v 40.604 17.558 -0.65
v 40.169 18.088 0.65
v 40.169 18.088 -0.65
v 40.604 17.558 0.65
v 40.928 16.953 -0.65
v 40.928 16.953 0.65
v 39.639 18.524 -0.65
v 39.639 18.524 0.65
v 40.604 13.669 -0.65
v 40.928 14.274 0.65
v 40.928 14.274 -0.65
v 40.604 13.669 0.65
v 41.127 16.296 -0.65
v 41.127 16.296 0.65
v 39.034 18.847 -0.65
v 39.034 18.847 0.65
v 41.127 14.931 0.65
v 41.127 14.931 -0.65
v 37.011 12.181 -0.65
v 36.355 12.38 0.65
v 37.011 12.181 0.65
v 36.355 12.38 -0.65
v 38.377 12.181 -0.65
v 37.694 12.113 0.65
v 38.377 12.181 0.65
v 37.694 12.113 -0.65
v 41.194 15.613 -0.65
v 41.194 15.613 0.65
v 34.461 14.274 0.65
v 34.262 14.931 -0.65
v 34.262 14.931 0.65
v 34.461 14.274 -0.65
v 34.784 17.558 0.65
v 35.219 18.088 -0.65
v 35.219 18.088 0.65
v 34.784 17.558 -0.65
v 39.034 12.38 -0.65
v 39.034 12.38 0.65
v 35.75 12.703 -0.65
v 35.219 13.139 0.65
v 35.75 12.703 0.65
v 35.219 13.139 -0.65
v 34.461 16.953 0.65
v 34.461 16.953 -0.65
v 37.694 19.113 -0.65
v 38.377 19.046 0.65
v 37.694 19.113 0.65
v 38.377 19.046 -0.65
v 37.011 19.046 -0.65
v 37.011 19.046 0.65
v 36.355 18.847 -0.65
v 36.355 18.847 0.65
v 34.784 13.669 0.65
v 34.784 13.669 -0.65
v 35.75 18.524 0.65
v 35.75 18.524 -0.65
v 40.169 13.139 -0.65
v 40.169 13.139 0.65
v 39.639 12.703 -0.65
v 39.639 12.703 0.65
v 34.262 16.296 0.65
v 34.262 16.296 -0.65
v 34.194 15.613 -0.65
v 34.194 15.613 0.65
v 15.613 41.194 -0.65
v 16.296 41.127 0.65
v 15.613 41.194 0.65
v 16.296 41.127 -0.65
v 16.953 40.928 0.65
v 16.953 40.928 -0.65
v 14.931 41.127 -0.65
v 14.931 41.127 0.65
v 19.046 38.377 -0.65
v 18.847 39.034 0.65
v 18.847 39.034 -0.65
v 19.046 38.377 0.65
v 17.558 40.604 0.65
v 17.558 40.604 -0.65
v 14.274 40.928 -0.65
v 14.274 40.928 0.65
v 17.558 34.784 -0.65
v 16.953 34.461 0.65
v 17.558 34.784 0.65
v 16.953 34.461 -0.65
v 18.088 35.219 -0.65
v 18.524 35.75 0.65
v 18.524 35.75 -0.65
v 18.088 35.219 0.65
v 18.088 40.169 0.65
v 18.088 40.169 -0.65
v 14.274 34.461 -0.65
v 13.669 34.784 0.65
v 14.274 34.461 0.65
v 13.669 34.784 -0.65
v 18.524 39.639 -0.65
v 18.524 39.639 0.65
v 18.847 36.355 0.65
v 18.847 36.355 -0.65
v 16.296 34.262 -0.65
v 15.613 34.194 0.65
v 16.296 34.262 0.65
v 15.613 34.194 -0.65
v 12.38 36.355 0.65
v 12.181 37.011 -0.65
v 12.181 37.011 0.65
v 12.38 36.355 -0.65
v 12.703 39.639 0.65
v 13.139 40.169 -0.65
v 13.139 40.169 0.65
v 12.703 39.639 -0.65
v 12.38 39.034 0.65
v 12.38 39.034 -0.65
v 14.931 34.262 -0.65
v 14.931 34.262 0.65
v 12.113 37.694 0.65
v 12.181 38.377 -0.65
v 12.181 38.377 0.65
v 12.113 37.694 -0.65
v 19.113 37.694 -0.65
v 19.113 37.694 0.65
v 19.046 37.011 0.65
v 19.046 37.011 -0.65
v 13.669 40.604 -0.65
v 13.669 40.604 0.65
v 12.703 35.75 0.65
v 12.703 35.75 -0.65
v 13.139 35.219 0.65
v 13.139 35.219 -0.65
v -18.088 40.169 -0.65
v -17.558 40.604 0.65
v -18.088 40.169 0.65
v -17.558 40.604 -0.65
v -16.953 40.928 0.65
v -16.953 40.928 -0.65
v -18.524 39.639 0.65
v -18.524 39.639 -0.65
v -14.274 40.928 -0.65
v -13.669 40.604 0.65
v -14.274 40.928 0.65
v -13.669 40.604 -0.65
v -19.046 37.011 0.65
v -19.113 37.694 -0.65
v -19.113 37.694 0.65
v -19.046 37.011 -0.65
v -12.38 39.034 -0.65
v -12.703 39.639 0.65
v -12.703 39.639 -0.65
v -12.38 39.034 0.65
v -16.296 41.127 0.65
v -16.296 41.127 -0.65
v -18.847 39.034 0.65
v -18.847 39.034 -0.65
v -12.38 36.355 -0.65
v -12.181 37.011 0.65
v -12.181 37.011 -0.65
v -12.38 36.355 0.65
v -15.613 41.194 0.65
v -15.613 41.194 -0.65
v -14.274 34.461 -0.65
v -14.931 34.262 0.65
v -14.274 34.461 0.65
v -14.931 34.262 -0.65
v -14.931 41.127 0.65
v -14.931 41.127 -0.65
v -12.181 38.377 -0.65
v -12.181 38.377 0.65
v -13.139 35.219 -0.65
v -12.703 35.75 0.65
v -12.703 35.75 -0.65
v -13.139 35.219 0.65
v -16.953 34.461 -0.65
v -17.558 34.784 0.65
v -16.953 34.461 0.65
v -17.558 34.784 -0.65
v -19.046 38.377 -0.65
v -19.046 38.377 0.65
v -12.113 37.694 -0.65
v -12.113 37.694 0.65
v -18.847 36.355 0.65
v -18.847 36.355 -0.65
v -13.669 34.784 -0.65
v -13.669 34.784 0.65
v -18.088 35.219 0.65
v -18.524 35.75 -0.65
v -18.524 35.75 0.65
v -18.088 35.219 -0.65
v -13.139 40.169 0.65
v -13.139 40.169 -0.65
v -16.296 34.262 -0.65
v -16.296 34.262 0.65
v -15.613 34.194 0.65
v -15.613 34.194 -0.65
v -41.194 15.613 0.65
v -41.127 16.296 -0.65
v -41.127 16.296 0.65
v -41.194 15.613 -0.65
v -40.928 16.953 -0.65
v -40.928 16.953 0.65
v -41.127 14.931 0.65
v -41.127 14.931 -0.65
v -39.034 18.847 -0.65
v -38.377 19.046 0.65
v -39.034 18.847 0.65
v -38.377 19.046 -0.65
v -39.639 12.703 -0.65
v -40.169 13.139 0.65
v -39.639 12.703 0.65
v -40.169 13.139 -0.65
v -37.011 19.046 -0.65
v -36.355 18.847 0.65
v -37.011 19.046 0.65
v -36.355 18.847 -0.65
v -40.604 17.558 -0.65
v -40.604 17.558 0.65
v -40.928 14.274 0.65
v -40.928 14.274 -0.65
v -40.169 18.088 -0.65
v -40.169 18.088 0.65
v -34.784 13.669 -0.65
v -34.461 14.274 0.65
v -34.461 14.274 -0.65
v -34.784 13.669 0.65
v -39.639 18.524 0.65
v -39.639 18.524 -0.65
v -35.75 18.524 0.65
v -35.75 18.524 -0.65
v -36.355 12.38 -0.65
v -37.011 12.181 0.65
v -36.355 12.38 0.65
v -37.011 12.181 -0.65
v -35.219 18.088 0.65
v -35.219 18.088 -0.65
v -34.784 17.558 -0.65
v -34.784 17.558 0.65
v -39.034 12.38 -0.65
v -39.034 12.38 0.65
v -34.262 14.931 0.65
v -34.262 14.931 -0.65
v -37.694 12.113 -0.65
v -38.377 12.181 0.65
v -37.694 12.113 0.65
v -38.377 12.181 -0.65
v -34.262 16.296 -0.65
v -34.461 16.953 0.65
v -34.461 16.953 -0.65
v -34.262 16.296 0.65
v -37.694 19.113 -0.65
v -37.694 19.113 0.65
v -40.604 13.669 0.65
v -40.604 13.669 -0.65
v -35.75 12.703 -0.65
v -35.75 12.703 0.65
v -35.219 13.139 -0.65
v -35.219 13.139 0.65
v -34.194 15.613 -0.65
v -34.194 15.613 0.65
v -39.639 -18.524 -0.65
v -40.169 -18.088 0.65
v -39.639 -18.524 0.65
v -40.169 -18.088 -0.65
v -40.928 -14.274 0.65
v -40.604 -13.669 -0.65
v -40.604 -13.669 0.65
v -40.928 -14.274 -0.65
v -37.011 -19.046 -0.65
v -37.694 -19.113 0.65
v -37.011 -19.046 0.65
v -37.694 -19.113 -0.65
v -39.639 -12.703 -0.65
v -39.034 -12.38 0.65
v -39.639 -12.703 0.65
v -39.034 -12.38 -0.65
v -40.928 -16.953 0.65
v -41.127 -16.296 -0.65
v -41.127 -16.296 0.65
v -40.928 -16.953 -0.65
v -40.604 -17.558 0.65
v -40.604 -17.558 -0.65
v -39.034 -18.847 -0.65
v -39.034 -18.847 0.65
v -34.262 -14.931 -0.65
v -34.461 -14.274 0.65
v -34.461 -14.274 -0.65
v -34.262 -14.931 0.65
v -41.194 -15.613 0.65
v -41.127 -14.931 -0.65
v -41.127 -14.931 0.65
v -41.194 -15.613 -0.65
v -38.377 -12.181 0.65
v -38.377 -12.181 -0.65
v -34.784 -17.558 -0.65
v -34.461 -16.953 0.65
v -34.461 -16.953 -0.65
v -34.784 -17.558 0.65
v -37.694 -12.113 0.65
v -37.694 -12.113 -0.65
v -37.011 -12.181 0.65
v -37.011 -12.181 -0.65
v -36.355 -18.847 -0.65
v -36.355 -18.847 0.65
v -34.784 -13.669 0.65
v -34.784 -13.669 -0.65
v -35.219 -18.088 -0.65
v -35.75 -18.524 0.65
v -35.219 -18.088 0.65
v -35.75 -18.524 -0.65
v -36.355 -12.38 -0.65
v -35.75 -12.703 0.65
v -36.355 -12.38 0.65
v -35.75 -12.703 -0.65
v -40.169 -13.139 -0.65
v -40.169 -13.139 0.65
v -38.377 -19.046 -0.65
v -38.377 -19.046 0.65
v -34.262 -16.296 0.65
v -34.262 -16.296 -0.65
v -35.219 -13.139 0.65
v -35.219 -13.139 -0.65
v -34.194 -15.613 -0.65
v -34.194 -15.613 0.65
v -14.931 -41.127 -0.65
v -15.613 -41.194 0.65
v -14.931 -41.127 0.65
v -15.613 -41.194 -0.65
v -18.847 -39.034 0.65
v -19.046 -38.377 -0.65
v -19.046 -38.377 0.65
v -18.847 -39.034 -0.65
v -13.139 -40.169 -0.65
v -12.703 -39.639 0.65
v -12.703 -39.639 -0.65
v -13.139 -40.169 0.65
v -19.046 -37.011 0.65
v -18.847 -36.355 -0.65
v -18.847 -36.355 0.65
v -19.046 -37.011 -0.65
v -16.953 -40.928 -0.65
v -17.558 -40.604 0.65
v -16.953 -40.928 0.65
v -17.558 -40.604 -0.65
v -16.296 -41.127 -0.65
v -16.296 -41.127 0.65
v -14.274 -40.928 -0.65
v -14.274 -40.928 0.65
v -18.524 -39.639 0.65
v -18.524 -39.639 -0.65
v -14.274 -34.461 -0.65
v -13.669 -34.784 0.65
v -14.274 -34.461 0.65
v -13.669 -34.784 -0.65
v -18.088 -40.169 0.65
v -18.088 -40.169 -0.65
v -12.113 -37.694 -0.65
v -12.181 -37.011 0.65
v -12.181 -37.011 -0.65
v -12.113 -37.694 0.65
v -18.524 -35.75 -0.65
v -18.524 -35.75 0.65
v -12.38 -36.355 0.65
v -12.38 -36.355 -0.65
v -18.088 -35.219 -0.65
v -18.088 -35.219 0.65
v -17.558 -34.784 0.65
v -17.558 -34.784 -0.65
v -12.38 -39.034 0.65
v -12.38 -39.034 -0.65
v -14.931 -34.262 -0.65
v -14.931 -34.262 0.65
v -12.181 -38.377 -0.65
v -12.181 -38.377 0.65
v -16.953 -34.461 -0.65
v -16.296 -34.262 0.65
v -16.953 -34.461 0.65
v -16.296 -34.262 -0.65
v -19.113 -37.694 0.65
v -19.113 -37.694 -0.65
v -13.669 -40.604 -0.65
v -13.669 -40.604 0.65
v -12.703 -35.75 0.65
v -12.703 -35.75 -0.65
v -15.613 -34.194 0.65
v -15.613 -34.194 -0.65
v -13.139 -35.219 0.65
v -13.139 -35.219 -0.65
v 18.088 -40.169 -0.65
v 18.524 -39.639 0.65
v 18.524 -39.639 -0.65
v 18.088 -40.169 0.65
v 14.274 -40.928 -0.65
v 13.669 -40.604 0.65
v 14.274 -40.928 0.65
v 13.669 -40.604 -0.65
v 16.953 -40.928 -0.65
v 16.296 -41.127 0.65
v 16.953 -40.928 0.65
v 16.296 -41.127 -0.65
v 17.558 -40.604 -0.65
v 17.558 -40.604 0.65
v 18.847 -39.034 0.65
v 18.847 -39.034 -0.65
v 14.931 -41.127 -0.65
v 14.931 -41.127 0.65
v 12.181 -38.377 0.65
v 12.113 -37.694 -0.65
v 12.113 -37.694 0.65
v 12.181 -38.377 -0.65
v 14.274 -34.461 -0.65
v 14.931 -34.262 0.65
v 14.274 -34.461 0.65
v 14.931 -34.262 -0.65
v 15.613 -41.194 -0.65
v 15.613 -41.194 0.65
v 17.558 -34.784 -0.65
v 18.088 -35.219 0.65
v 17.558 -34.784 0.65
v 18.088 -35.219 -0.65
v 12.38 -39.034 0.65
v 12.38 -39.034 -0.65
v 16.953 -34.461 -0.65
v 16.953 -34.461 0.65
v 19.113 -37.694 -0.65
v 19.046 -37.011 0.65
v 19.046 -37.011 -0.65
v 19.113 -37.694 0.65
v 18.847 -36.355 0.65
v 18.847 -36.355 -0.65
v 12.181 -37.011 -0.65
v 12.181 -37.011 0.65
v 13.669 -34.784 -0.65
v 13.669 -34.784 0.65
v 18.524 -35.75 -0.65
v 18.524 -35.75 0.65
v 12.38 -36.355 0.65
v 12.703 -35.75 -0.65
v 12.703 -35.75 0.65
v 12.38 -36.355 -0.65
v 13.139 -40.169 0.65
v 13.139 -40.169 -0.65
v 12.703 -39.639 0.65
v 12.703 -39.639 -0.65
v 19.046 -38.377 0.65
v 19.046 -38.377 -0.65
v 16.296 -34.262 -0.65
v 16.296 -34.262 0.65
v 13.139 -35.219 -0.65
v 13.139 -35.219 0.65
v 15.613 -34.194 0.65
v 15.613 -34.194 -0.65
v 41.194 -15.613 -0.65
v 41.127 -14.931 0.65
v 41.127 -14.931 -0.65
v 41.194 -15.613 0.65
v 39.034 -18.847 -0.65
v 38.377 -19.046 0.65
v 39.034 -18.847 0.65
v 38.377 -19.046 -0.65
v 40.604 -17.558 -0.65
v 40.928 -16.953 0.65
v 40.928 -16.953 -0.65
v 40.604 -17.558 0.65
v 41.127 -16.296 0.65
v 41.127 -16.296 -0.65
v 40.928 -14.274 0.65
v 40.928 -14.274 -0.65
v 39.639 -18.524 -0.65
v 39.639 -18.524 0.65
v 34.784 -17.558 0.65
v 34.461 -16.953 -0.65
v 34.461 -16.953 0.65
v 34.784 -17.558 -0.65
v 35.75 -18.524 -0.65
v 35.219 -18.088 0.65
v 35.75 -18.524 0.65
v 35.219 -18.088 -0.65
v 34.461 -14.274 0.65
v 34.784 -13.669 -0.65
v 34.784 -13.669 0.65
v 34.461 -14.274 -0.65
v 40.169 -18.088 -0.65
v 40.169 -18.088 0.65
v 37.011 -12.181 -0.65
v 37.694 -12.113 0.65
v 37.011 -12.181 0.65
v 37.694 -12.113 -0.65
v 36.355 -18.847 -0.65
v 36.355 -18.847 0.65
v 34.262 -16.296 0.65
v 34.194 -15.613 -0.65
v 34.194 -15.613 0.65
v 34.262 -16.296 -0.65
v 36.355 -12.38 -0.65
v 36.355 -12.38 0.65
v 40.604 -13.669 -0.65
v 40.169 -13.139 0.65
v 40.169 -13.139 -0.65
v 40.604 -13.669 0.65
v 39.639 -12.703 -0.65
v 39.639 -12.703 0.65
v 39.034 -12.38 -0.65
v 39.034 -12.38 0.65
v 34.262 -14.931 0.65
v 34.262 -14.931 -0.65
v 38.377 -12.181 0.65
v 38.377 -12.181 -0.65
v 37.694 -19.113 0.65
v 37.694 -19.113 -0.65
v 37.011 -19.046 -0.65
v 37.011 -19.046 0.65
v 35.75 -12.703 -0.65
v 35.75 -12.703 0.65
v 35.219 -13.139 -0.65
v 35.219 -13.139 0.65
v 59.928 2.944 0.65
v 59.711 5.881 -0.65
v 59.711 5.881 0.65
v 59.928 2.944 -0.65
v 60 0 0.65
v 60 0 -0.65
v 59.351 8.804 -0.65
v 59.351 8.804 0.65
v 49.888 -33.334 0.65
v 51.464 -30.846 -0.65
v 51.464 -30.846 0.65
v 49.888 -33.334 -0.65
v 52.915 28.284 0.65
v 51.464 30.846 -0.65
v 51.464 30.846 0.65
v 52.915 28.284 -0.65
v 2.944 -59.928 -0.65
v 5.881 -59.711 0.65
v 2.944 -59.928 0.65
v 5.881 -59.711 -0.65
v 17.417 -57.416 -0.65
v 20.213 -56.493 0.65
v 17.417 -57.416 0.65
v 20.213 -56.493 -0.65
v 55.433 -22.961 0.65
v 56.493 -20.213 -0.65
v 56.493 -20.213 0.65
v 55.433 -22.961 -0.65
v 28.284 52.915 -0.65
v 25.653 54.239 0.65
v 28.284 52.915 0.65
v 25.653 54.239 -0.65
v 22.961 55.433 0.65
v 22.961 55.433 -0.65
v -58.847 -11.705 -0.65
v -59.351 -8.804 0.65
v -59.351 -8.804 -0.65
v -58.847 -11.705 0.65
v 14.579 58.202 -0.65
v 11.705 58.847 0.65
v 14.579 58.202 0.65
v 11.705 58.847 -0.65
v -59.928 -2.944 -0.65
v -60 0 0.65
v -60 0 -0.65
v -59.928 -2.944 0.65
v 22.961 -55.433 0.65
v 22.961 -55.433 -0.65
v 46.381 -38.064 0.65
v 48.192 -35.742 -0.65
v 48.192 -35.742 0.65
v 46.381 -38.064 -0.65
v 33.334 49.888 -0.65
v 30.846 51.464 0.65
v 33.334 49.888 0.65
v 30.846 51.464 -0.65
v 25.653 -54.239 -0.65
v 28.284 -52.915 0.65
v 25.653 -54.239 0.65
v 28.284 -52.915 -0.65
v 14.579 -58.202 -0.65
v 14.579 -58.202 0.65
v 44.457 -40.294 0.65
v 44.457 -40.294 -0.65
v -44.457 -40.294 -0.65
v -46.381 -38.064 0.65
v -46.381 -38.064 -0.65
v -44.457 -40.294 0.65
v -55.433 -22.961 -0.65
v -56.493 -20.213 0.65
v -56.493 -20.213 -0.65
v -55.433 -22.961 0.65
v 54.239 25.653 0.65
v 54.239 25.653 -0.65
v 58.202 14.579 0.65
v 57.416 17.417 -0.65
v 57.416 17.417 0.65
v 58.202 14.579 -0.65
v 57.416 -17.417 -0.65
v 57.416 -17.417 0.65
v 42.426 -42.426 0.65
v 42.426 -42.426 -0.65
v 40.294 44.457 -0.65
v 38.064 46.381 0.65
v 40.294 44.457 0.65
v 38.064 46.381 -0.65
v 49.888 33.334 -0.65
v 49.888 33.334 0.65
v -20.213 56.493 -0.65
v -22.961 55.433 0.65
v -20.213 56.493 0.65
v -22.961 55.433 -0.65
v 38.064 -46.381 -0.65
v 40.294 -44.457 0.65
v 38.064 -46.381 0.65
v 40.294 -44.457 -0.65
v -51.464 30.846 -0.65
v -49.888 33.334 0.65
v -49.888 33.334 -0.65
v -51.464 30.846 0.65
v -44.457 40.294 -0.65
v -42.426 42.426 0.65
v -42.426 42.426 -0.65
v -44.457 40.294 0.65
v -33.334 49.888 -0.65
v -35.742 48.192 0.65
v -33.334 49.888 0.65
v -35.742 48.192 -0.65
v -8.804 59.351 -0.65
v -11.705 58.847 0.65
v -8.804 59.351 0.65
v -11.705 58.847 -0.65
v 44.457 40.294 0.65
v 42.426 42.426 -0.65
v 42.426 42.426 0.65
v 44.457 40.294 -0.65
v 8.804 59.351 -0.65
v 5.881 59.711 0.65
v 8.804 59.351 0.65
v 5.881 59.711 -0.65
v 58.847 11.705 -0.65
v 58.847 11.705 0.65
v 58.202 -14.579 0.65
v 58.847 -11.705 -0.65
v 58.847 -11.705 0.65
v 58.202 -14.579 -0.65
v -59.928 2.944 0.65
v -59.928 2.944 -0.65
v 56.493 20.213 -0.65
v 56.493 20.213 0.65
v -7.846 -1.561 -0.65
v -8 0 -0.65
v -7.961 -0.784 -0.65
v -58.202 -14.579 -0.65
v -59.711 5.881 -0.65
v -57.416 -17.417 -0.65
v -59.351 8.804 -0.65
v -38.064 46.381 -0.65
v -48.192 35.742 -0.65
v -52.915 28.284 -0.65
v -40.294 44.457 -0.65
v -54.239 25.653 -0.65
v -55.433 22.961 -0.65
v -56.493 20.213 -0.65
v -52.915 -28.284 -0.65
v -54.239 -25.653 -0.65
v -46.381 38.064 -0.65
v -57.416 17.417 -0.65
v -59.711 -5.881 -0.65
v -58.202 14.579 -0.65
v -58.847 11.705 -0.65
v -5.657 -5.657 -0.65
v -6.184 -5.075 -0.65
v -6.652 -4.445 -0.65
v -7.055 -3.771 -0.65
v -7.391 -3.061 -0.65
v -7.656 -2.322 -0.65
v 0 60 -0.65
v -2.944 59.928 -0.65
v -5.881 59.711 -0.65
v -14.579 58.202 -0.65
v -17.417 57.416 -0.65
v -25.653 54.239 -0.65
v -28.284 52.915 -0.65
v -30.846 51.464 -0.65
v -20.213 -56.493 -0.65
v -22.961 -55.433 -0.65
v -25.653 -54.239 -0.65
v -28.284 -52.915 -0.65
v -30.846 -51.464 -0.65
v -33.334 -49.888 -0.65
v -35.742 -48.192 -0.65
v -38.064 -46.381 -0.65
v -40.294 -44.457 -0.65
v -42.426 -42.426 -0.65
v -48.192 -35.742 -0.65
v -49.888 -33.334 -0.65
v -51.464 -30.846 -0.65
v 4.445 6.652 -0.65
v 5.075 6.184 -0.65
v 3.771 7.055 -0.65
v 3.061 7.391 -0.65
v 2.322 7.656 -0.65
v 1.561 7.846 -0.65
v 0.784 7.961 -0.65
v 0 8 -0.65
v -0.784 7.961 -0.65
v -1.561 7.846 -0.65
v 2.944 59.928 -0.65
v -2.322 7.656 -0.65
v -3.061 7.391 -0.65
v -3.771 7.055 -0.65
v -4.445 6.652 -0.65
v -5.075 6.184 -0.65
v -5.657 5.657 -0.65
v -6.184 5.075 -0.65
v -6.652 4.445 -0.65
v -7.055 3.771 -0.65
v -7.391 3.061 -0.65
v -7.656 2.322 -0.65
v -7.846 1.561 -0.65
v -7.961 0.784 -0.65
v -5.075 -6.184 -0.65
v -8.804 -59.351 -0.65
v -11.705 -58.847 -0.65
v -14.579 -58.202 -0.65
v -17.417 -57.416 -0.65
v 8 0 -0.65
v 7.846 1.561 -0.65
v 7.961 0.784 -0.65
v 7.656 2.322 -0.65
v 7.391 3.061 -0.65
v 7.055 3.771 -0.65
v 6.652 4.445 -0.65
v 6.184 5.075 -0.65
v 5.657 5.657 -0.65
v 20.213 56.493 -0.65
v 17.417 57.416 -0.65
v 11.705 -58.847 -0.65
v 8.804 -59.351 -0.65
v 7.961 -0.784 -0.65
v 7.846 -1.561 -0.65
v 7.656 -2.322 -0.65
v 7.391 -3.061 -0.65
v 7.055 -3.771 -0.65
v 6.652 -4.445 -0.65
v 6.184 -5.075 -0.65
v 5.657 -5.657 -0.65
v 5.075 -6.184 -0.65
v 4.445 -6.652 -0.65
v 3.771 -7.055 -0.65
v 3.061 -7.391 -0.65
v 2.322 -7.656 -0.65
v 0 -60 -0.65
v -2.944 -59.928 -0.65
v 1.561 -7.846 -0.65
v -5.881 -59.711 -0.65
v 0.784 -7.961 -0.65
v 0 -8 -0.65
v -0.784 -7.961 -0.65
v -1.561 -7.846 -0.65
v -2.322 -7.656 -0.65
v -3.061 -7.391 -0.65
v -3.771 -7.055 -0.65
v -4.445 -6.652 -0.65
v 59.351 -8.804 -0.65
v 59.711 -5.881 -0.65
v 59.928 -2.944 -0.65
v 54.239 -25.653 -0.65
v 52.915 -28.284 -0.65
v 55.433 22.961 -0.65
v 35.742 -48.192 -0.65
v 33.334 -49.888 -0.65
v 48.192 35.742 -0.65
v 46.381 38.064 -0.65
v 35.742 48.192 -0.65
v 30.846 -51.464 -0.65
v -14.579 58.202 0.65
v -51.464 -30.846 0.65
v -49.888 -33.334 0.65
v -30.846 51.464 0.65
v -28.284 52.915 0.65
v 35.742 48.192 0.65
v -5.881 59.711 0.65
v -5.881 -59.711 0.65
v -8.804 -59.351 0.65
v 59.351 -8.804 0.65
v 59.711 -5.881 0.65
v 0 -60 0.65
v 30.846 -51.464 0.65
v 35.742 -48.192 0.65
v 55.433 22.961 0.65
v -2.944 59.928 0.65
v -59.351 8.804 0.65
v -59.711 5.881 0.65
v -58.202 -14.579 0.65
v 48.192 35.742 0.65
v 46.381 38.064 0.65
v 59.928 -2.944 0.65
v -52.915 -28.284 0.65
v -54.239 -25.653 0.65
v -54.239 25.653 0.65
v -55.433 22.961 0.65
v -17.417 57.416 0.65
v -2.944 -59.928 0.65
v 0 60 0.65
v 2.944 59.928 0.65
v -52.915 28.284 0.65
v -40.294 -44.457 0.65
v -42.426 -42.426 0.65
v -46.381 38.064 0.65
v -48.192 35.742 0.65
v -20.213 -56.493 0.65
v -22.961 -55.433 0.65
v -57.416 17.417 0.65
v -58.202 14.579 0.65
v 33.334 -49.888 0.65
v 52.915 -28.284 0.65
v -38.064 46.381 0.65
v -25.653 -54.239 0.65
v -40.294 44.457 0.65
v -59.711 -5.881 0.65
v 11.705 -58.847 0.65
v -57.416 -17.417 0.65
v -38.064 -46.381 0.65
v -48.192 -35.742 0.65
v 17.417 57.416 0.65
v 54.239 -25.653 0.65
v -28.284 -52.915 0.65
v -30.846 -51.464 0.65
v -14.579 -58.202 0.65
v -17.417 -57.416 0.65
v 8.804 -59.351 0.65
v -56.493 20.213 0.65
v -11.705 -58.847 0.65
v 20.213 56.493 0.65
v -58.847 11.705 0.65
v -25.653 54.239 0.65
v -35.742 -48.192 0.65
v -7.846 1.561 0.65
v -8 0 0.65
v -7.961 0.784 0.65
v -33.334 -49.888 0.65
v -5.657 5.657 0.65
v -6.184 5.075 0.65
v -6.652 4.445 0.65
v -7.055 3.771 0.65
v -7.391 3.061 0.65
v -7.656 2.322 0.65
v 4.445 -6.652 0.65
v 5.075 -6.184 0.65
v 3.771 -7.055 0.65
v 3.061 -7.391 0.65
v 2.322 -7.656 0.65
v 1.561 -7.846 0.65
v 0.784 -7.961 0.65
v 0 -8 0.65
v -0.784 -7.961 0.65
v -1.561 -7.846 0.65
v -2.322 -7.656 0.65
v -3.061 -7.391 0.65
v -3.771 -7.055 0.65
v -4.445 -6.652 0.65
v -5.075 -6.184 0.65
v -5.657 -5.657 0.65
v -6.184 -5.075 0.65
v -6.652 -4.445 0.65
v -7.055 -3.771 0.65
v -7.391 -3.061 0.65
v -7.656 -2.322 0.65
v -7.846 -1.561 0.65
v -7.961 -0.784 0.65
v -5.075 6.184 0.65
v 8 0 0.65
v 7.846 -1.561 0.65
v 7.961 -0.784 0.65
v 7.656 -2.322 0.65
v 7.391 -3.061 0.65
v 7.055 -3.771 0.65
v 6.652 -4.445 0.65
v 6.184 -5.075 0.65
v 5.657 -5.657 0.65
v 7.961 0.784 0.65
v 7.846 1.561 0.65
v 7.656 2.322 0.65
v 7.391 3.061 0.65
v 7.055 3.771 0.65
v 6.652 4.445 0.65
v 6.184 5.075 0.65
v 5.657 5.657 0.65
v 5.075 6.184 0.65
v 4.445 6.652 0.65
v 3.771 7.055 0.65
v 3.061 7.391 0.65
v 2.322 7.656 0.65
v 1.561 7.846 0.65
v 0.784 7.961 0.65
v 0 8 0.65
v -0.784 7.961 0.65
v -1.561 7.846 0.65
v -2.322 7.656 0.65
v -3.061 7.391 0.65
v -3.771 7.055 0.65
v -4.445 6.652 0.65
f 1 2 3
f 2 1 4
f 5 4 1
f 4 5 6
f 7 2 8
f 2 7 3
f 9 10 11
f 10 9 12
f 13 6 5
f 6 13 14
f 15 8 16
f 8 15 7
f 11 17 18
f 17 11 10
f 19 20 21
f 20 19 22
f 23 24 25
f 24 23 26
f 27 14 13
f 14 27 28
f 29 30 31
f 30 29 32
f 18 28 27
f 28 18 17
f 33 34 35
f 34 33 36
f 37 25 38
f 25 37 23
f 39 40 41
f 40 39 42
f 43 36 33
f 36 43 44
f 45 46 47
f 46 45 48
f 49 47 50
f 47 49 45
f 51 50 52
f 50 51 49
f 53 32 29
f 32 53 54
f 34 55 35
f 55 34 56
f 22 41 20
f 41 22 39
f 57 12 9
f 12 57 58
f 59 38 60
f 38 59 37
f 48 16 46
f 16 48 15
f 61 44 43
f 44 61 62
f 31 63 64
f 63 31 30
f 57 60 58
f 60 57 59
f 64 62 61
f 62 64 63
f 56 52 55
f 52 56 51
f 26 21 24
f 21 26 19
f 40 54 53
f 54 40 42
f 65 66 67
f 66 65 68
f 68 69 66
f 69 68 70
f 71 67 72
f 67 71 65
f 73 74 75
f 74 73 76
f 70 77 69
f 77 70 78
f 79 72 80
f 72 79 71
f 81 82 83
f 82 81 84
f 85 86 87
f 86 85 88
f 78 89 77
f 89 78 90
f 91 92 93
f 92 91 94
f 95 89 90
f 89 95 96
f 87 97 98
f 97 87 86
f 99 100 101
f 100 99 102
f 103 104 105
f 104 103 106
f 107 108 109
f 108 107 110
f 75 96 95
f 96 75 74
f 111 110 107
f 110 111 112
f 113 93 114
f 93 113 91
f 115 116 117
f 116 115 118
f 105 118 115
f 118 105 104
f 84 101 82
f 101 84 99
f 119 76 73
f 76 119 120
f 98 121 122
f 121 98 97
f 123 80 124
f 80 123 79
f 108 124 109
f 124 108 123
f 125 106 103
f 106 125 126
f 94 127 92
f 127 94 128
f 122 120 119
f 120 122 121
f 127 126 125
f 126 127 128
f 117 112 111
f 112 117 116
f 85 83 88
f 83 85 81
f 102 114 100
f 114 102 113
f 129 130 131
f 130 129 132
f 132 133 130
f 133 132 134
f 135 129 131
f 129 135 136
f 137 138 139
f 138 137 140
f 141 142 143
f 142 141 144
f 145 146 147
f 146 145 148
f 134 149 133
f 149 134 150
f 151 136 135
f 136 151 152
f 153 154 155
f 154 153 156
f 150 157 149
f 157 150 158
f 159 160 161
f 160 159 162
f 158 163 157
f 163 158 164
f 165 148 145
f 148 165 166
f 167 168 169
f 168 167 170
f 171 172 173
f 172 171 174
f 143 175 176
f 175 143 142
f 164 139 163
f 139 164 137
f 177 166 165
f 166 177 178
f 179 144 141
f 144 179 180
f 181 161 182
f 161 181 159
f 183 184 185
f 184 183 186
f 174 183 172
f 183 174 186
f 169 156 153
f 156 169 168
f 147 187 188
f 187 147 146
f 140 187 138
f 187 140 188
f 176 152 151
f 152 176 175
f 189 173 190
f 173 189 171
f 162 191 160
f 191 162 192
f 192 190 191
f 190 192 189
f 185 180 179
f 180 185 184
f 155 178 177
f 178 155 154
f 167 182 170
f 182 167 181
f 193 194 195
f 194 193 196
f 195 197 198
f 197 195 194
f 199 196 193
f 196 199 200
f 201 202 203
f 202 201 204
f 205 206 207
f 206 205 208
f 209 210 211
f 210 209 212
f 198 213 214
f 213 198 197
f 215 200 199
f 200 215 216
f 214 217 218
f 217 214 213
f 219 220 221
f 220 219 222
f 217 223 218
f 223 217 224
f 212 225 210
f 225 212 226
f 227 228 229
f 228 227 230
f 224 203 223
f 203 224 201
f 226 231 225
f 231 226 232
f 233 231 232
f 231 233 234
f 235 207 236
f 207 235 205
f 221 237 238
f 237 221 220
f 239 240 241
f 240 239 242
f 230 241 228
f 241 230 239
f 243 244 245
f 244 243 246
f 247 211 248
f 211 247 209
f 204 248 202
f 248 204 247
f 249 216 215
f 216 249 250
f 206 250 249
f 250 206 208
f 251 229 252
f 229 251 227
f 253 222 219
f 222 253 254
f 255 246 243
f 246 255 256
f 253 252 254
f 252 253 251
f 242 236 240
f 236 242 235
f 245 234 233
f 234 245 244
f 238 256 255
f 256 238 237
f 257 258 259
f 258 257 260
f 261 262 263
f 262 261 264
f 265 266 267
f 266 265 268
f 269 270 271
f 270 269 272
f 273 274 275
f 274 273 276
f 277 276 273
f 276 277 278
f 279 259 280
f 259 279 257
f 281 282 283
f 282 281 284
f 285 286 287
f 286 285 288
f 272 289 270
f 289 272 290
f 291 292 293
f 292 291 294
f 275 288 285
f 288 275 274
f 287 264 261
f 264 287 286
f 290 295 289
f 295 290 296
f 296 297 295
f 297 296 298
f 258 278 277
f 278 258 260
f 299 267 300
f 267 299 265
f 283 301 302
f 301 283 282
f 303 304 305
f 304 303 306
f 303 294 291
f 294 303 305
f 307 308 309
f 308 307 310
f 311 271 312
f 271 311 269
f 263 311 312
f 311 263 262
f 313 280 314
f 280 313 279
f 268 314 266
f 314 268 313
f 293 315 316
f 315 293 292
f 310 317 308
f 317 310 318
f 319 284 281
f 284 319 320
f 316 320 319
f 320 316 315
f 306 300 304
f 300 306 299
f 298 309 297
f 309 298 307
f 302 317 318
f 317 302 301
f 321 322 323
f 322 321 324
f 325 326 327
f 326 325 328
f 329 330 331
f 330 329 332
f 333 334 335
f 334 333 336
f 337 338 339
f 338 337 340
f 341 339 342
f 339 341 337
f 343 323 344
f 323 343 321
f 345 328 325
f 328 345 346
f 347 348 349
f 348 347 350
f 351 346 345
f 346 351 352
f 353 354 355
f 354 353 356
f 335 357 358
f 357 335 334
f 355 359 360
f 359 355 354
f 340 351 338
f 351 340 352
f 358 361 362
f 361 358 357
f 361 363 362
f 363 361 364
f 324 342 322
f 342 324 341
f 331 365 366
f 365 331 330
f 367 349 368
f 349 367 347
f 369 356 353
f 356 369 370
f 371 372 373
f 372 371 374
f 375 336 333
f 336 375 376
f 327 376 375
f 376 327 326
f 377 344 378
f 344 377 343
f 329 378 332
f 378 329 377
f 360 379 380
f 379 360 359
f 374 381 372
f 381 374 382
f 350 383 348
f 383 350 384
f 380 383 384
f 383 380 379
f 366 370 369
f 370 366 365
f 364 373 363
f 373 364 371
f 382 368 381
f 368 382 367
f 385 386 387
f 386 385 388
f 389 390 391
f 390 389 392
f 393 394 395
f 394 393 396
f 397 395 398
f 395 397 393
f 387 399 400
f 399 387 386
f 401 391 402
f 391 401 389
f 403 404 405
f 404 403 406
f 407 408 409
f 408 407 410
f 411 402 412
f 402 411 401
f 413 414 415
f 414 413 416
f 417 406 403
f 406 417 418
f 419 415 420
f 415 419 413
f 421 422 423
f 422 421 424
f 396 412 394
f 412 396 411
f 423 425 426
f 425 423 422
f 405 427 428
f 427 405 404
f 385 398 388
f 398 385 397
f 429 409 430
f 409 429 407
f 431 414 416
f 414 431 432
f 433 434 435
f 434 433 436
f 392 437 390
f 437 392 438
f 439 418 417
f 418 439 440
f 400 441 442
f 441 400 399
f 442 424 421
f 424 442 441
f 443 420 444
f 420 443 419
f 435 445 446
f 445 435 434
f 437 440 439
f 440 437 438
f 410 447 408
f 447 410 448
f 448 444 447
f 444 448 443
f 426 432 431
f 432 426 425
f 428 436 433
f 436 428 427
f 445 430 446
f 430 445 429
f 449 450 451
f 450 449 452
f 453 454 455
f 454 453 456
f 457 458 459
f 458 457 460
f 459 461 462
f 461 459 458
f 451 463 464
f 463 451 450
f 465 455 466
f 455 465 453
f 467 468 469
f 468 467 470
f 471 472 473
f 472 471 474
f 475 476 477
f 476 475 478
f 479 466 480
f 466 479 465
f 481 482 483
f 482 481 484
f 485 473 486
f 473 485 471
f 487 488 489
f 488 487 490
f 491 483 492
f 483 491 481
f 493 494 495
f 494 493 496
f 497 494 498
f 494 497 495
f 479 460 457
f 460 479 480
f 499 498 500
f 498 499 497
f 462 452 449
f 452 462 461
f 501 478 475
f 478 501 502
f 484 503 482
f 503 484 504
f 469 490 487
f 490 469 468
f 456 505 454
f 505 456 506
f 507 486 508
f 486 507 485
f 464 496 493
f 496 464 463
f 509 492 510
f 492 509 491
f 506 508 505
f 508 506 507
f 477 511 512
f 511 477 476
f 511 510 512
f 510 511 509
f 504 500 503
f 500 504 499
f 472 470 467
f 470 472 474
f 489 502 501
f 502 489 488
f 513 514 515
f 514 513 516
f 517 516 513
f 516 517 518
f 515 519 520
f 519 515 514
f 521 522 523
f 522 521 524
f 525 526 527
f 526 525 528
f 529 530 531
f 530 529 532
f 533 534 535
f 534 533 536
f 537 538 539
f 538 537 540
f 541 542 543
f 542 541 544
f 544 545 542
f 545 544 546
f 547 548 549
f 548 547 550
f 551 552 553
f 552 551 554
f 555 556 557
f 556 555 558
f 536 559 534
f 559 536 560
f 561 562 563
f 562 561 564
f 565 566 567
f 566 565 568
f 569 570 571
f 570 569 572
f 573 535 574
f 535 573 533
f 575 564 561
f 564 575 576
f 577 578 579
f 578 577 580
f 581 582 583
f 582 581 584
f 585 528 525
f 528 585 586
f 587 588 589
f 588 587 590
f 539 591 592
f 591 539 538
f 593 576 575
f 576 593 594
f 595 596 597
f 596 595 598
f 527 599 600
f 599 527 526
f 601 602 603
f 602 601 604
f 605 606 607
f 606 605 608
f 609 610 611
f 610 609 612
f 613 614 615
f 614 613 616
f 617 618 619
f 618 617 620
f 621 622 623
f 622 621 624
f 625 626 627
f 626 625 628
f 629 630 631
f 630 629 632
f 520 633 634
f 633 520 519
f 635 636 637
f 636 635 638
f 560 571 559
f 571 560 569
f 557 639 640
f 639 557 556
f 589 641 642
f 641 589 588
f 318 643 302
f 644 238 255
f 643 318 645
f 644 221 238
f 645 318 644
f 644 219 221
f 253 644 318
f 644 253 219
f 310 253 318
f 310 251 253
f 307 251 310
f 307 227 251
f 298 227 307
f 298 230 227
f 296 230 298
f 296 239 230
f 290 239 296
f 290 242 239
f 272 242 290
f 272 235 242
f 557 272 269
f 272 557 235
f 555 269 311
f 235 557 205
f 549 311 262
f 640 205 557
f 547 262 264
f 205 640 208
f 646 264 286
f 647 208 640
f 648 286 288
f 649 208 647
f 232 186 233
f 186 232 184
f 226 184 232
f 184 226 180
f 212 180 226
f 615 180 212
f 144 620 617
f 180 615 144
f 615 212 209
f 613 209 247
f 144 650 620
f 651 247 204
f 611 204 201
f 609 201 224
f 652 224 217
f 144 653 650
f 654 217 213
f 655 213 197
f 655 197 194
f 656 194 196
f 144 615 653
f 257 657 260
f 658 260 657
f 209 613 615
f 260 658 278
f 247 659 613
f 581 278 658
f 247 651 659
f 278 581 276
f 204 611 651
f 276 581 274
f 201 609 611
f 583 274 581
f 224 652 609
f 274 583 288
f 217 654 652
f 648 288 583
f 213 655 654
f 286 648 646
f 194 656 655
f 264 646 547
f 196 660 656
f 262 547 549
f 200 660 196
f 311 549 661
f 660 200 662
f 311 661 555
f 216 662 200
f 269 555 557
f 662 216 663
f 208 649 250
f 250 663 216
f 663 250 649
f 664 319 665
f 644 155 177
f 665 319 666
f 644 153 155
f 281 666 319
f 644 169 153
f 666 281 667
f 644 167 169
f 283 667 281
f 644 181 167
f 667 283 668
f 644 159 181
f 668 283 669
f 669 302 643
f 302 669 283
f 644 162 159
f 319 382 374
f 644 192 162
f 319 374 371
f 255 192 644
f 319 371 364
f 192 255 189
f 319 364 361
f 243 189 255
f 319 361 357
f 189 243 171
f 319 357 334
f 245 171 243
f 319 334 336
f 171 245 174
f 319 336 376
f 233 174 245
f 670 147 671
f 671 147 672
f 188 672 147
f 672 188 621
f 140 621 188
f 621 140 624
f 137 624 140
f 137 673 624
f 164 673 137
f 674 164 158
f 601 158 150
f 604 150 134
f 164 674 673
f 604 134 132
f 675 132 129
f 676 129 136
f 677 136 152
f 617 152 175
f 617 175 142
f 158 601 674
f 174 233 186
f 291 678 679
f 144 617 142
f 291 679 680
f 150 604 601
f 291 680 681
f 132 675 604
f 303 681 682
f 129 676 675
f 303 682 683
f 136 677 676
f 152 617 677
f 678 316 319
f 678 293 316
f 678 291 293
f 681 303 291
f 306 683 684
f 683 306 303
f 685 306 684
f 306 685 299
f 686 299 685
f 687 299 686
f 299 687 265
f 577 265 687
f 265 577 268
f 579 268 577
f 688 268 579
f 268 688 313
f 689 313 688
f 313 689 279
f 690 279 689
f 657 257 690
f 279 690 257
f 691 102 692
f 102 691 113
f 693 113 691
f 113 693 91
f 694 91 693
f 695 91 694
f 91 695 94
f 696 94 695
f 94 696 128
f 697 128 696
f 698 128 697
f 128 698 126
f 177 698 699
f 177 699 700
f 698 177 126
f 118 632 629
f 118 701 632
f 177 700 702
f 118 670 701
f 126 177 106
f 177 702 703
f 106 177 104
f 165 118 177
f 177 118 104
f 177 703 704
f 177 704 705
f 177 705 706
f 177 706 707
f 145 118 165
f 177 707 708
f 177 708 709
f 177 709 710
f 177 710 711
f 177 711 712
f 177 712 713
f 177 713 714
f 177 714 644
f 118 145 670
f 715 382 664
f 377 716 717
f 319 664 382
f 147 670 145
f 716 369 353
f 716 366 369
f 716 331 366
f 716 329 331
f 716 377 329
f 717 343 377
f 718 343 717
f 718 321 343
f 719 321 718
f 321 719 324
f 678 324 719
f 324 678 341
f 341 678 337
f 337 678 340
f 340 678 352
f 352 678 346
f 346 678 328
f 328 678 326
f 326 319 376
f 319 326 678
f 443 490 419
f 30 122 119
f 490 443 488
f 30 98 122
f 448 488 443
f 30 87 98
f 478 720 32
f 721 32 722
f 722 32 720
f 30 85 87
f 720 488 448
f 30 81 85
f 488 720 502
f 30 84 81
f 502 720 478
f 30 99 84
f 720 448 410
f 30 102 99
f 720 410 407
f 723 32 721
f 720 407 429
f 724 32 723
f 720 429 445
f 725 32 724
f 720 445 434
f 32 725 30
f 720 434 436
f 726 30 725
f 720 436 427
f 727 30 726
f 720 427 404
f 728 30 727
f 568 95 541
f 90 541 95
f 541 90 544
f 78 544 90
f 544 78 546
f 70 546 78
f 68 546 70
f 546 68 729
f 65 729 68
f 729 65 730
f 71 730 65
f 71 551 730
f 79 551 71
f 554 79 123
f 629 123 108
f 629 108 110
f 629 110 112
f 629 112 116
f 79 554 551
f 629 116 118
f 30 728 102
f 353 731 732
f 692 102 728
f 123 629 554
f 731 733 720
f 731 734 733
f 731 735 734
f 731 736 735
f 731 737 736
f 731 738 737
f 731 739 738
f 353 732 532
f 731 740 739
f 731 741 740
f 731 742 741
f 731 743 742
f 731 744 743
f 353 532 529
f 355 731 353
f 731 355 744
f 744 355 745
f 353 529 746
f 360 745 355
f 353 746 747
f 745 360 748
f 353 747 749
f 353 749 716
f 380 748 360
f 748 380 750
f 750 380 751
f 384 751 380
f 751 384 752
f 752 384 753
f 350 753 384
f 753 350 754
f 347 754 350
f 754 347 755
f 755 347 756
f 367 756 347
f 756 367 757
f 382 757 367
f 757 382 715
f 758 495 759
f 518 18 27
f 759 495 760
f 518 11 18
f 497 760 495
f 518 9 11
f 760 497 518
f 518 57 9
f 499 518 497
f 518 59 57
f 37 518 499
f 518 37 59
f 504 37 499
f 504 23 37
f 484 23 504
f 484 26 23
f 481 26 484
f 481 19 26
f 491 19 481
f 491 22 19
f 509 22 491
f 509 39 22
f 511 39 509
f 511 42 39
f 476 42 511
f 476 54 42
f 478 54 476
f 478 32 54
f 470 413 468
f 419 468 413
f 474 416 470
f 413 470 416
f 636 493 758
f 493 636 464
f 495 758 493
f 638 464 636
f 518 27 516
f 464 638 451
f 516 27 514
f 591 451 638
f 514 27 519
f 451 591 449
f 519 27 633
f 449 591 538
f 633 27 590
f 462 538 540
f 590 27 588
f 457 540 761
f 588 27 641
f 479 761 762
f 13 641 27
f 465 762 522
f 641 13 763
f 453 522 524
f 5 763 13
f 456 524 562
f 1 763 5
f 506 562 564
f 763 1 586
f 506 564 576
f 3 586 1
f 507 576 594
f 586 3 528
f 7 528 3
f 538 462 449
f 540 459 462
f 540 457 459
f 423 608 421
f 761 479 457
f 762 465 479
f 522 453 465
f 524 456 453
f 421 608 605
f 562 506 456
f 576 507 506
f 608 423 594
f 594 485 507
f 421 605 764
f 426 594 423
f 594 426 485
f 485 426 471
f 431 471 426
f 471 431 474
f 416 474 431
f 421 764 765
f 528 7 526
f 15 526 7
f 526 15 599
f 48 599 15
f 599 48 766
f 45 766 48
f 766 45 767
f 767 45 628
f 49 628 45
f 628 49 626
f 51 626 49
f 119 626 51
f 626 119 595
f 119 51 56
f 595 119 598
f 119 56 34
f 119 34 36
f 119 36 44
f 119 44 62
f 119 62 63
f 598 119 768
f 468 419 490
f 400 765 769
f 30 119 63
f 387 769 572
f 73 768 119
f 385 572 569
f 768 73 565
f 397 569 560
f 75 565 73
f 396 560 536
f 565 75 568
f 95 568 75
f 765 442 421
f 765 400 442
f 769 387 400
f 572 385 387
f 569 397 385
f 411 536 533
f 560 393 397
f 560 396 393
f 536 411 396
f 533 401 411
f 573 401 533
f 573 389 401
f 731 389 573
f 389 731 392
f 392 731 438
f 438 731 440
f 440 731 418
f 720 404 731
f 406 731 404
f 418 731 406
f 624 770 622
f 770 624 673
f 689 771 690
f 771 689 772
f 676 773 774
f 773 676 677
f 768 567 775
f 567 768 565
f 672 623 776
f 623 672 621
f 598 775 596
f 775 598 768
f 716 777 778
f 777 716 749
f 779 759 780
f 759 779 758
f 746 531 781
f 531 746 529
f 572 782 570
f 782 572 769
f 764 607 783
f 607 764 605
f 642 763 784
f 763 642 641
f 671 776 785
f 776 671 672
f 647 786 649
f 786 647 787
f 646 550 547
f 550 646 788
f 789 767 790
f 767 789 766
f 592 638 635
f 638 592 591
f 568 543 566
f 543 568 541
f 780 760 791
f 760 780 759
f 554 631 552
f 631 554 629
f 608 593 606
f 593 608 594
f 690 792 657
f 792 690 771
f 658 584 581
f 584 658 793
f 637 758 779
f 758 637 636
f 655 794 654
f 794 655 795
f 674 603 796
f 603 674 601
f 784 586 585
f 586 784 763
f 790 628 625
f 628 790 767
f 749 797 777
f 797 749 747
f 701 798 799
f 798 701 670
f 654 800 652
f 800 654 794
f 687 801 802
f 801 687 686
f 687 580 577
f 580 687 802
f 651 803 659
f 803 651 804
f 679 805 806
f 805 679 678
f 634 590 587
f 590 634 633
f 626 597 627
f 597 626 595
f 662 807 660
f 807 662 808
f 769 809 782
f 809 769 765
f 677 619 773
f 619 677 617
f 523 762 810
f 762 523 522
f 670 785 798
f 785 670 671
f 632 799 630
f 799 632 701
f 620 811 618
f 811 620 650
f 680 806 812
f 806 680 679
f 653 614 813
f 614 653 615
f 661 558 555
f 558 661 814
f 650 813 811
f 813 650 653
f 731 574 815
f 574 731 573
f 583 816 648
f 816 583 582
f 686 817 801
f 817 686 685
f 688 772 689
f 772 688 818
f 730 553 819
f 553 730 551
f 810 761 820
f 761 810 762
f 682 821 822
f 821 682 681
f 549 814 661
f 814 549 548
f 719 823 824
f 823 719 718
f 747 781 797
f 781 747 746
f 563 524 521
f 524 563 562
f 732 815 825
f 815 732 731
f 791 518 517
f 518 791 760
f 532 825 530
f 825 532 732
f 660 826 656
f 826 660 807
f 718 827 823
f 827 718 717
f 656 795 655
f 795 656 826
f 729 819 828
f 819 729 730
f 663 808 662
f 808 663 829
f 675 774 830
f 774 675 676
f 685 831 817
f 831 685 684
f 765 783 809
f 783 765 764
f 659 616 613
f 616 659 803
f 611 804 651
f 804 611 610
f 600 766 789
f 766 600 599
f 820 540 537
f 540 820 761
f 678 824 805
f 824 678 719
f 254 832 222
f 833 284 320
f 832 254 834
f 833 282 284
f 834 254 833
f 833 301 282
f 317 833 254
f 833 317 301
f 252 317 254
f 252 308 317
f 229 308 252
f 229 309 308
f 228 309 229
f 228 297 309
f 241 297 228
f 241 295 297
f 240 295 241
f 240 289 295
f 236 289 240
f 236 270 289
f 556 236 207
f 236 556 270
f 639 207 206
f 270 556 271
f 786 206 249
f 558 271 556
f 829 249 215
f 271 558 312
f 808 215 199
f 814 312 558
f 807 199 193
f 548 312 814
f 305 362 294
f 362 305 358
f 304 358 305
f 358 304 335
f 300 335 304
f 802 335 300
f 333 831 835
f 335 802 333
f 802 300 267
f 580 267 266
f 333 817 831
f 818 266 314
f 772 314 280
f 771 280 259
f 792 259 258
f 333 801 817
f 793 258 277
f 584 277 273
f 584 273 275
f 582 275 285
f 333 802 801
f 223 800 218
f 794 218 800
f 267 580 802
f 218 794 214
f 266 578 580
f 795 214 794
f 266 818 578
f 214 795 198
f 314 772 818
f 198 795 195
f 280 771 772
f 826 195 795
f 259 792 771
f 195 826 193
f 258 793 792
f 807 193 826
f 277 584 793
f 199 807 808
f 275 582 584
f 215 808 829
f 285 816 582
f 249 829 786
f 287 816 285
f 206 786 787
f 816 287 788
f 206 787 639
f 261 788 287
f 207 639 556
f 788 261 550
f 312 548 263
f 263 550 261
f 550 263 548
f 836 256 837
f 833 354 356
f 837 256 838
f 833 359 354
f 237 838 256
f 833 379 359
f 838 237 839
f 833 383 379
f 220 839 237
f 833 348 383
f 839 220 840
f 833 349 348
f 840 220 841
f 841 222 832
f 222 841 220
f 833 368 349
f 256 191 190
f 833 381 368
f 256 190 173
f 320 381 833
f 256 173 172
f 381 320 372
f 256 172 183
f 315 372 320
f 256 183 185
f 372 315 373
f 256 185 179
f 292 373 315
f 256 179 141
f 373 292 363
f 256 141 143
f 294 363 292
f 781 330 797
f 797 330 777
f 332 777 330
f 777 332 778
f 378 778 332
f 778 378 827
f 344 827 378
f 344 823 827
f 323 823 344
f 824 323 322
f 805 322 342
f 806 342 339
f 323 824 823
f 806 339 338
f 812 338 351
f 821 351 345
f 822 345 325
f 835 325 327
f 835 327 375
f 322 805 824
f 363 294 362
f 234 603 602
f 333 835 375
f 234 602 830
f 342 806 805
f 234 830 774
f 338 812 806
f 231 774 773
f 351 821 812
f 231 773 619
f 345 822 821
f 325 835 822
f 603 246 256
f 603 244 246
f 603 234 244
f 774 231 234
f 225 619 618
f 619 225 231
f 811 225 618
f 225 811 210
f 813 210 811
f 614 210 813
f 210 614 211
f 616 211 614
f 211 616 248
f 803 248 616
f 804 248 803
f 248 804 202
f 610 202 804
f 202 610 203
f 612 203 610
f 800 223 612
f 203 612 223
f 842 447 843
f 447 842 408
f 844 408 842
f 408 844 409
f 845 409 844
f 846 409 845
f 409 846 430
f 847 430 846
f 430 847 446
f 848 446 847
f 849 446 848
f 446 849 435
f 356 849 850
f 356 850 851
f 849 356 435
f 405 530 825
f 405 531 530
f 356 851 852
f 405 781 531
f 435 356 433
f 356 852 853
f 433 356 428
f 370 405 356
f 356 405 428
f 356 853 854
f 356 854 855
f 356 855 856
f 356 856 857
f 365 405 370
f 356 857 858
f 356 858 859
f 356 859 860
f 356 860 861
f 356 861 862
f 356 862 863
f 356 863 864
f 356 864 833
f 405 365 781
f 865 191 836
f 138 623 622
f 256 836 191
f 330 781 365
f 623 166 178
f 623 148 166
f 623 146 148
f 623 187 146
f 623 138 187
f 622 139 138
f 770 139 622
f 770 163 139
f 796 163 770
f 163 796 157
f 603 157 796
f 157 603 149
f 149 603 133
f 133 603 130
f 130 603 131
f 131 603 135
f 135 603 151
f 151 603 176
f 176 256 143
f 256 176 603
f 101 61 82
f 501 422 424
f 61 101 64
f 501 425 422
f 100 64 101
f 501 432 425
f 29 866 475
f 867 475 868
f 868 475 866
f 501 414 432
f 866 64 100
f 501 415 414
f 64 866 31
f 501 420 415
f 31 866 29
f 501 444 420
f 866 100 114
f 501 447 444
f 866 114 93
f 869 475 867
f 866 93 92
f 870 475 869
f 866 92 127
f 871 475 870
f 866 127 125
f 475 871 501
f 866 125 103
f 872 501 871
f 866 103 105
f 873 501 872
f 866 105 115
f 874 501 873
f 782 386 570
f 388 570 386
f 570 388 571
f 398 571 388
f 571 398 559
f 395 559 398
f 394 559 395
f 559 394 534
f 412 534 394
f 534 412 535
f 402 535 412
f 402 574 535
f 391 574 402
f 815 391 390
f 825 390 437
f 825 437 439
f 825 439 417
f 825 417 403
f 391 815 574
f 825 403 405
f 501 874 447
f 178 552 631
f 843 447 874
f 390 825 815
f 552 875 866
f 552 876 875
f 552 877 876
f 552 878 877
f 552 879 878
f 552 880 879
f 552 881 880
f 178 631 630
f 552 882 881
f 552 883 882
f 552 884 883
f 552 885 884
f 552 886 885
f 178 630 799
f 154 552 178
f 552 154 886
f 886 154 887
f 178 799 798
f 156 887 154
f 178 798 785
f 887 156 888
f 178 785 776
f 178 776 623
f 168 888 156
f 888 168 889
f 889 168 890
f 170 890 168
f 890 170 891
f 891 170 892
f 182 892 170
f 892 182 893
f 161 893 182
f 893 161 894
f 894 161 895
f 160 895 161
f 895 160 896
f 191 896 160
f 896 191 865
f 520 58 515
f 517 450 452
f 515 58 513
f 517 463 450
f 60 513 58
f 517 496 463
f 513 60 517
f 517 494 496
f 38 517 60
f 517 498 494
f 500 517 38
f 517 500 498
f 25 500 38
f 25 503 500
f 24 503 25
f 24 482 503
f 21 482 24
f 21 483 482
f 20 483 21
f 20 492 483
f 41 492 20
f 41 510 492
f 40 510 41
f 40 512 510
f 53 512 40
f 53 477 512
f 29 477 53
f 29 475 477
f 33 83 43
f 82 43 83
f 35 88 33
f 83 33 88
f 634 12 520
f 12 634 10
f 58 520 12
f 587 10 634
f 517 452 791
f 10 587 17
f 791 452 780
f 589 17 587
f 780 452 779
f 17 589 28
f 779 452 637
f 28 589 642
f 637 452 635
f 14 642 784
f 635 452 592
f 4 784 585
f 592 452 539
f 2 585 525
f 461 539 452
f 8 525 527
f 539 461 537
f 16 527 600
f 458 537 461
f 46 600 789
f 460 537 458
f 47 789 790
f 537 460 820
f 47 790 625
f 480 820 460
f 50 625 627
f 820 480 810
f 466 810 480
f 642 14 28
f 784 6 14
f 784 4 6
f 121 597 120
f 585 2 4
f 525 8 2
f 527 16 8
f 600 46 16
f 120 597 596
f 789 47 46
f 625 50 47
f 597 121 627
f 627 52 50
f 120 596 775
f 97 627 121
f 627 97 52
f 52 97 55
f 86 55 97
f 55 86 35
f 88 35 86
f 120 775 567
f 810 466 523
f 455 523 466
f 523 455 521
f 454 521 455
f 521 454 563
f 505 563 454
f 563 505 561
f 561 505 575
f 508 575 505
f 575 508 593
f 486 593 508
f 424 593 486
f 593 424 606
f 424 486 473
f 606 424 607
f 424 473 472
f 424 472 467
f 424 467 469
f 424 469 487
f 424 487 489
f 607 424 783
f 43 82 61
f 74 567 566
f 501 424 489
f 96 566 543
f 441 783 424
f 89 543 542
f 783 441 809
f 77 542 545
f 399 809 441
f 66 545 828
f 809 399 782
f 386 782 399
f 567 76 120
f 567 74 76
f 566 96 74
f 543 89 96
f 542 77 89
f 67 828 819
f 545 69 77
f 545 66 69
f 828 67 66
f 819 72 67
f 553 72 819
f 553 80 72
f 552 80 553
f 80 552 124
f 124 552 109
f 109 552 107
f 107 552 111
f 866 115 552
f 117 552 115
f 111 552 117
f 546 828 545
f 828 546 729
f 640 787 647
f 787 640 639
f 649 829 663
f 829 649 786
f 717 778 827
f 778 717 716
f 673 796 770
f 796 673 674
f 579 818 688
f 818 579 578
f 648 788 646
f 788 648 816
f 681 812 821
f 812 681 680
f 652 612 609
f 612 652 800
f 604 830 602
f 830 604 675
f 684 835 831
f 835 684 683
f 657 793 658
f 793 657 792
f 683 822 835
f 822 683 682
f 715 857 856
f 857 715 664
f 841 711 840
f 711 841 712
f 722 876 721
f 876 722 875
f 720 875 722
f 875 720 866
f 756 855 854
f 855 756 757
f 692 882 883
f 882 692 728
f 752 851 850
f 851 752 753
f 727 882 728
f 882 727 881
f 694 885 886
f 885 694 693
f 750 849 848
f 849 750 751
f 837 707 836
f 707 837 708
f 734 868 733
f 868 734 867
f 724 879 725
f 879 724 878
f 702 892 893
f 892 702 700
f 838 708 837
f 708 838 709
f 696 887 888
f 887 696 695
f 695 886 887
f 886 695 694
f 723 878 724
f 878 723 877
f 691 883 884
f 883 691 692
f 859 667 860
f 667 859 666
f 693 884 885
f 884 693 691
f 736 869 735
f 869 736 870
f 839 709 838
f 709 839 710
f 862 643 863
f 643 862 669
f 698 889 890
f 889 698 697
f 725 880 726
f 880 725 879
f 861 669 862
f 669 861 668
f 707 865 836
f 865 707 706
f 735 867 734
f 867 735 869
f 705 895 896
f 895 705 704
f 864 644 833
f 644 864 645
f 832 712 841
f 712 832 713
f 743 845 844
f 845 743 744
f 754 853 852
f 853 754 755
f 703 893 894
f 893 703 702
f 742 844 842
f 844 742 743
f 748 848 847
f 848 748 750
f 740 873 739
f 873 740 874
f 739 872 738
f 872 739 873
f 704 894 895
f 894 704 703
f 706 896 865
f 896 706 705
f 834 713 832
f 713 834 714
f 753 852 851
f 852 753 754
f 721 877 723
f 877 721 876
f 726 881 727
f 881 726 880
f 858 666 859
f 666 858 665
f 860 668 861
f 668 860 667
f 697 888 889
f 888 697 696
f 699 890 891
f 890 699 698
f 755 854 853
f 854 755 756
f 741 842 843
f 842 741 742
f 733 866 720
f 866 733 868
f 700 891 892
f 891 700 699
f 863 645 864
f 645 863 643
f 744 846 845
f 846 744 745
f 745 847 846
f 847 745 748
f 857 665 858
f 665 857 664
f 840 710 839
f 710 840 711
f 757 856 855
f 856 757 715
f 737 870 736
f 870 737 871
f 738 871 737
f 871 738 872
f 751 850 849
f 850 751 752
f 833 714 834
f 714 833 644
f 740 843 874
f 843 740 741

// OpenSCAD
/*
 * Spacer for CD/DVD Version
 * Recommended thickness: 1.2 - 1.5mm (to match thicker CD/DVD discs)
 */

module cd_dvd_spacer(od=120, thickness=1.3, id=16) {
    difference() {
        cylinder(d=od, h=thickness, center=true, $fn=128);
        cylinder(d=id, h=thickness+0.2, center=true, $fn=64);
        
        // Lightening holes
        for (i = [0:7]) {
            rotate([0,0,i*45 + 22.5])
                translate([od*0.34, 0, 0])
                    cylinder(d=7, h=thickness+0.2, center=true, $fn=32);
        }
    }
}

cd_dvd_spacer(thickness=1.3);
